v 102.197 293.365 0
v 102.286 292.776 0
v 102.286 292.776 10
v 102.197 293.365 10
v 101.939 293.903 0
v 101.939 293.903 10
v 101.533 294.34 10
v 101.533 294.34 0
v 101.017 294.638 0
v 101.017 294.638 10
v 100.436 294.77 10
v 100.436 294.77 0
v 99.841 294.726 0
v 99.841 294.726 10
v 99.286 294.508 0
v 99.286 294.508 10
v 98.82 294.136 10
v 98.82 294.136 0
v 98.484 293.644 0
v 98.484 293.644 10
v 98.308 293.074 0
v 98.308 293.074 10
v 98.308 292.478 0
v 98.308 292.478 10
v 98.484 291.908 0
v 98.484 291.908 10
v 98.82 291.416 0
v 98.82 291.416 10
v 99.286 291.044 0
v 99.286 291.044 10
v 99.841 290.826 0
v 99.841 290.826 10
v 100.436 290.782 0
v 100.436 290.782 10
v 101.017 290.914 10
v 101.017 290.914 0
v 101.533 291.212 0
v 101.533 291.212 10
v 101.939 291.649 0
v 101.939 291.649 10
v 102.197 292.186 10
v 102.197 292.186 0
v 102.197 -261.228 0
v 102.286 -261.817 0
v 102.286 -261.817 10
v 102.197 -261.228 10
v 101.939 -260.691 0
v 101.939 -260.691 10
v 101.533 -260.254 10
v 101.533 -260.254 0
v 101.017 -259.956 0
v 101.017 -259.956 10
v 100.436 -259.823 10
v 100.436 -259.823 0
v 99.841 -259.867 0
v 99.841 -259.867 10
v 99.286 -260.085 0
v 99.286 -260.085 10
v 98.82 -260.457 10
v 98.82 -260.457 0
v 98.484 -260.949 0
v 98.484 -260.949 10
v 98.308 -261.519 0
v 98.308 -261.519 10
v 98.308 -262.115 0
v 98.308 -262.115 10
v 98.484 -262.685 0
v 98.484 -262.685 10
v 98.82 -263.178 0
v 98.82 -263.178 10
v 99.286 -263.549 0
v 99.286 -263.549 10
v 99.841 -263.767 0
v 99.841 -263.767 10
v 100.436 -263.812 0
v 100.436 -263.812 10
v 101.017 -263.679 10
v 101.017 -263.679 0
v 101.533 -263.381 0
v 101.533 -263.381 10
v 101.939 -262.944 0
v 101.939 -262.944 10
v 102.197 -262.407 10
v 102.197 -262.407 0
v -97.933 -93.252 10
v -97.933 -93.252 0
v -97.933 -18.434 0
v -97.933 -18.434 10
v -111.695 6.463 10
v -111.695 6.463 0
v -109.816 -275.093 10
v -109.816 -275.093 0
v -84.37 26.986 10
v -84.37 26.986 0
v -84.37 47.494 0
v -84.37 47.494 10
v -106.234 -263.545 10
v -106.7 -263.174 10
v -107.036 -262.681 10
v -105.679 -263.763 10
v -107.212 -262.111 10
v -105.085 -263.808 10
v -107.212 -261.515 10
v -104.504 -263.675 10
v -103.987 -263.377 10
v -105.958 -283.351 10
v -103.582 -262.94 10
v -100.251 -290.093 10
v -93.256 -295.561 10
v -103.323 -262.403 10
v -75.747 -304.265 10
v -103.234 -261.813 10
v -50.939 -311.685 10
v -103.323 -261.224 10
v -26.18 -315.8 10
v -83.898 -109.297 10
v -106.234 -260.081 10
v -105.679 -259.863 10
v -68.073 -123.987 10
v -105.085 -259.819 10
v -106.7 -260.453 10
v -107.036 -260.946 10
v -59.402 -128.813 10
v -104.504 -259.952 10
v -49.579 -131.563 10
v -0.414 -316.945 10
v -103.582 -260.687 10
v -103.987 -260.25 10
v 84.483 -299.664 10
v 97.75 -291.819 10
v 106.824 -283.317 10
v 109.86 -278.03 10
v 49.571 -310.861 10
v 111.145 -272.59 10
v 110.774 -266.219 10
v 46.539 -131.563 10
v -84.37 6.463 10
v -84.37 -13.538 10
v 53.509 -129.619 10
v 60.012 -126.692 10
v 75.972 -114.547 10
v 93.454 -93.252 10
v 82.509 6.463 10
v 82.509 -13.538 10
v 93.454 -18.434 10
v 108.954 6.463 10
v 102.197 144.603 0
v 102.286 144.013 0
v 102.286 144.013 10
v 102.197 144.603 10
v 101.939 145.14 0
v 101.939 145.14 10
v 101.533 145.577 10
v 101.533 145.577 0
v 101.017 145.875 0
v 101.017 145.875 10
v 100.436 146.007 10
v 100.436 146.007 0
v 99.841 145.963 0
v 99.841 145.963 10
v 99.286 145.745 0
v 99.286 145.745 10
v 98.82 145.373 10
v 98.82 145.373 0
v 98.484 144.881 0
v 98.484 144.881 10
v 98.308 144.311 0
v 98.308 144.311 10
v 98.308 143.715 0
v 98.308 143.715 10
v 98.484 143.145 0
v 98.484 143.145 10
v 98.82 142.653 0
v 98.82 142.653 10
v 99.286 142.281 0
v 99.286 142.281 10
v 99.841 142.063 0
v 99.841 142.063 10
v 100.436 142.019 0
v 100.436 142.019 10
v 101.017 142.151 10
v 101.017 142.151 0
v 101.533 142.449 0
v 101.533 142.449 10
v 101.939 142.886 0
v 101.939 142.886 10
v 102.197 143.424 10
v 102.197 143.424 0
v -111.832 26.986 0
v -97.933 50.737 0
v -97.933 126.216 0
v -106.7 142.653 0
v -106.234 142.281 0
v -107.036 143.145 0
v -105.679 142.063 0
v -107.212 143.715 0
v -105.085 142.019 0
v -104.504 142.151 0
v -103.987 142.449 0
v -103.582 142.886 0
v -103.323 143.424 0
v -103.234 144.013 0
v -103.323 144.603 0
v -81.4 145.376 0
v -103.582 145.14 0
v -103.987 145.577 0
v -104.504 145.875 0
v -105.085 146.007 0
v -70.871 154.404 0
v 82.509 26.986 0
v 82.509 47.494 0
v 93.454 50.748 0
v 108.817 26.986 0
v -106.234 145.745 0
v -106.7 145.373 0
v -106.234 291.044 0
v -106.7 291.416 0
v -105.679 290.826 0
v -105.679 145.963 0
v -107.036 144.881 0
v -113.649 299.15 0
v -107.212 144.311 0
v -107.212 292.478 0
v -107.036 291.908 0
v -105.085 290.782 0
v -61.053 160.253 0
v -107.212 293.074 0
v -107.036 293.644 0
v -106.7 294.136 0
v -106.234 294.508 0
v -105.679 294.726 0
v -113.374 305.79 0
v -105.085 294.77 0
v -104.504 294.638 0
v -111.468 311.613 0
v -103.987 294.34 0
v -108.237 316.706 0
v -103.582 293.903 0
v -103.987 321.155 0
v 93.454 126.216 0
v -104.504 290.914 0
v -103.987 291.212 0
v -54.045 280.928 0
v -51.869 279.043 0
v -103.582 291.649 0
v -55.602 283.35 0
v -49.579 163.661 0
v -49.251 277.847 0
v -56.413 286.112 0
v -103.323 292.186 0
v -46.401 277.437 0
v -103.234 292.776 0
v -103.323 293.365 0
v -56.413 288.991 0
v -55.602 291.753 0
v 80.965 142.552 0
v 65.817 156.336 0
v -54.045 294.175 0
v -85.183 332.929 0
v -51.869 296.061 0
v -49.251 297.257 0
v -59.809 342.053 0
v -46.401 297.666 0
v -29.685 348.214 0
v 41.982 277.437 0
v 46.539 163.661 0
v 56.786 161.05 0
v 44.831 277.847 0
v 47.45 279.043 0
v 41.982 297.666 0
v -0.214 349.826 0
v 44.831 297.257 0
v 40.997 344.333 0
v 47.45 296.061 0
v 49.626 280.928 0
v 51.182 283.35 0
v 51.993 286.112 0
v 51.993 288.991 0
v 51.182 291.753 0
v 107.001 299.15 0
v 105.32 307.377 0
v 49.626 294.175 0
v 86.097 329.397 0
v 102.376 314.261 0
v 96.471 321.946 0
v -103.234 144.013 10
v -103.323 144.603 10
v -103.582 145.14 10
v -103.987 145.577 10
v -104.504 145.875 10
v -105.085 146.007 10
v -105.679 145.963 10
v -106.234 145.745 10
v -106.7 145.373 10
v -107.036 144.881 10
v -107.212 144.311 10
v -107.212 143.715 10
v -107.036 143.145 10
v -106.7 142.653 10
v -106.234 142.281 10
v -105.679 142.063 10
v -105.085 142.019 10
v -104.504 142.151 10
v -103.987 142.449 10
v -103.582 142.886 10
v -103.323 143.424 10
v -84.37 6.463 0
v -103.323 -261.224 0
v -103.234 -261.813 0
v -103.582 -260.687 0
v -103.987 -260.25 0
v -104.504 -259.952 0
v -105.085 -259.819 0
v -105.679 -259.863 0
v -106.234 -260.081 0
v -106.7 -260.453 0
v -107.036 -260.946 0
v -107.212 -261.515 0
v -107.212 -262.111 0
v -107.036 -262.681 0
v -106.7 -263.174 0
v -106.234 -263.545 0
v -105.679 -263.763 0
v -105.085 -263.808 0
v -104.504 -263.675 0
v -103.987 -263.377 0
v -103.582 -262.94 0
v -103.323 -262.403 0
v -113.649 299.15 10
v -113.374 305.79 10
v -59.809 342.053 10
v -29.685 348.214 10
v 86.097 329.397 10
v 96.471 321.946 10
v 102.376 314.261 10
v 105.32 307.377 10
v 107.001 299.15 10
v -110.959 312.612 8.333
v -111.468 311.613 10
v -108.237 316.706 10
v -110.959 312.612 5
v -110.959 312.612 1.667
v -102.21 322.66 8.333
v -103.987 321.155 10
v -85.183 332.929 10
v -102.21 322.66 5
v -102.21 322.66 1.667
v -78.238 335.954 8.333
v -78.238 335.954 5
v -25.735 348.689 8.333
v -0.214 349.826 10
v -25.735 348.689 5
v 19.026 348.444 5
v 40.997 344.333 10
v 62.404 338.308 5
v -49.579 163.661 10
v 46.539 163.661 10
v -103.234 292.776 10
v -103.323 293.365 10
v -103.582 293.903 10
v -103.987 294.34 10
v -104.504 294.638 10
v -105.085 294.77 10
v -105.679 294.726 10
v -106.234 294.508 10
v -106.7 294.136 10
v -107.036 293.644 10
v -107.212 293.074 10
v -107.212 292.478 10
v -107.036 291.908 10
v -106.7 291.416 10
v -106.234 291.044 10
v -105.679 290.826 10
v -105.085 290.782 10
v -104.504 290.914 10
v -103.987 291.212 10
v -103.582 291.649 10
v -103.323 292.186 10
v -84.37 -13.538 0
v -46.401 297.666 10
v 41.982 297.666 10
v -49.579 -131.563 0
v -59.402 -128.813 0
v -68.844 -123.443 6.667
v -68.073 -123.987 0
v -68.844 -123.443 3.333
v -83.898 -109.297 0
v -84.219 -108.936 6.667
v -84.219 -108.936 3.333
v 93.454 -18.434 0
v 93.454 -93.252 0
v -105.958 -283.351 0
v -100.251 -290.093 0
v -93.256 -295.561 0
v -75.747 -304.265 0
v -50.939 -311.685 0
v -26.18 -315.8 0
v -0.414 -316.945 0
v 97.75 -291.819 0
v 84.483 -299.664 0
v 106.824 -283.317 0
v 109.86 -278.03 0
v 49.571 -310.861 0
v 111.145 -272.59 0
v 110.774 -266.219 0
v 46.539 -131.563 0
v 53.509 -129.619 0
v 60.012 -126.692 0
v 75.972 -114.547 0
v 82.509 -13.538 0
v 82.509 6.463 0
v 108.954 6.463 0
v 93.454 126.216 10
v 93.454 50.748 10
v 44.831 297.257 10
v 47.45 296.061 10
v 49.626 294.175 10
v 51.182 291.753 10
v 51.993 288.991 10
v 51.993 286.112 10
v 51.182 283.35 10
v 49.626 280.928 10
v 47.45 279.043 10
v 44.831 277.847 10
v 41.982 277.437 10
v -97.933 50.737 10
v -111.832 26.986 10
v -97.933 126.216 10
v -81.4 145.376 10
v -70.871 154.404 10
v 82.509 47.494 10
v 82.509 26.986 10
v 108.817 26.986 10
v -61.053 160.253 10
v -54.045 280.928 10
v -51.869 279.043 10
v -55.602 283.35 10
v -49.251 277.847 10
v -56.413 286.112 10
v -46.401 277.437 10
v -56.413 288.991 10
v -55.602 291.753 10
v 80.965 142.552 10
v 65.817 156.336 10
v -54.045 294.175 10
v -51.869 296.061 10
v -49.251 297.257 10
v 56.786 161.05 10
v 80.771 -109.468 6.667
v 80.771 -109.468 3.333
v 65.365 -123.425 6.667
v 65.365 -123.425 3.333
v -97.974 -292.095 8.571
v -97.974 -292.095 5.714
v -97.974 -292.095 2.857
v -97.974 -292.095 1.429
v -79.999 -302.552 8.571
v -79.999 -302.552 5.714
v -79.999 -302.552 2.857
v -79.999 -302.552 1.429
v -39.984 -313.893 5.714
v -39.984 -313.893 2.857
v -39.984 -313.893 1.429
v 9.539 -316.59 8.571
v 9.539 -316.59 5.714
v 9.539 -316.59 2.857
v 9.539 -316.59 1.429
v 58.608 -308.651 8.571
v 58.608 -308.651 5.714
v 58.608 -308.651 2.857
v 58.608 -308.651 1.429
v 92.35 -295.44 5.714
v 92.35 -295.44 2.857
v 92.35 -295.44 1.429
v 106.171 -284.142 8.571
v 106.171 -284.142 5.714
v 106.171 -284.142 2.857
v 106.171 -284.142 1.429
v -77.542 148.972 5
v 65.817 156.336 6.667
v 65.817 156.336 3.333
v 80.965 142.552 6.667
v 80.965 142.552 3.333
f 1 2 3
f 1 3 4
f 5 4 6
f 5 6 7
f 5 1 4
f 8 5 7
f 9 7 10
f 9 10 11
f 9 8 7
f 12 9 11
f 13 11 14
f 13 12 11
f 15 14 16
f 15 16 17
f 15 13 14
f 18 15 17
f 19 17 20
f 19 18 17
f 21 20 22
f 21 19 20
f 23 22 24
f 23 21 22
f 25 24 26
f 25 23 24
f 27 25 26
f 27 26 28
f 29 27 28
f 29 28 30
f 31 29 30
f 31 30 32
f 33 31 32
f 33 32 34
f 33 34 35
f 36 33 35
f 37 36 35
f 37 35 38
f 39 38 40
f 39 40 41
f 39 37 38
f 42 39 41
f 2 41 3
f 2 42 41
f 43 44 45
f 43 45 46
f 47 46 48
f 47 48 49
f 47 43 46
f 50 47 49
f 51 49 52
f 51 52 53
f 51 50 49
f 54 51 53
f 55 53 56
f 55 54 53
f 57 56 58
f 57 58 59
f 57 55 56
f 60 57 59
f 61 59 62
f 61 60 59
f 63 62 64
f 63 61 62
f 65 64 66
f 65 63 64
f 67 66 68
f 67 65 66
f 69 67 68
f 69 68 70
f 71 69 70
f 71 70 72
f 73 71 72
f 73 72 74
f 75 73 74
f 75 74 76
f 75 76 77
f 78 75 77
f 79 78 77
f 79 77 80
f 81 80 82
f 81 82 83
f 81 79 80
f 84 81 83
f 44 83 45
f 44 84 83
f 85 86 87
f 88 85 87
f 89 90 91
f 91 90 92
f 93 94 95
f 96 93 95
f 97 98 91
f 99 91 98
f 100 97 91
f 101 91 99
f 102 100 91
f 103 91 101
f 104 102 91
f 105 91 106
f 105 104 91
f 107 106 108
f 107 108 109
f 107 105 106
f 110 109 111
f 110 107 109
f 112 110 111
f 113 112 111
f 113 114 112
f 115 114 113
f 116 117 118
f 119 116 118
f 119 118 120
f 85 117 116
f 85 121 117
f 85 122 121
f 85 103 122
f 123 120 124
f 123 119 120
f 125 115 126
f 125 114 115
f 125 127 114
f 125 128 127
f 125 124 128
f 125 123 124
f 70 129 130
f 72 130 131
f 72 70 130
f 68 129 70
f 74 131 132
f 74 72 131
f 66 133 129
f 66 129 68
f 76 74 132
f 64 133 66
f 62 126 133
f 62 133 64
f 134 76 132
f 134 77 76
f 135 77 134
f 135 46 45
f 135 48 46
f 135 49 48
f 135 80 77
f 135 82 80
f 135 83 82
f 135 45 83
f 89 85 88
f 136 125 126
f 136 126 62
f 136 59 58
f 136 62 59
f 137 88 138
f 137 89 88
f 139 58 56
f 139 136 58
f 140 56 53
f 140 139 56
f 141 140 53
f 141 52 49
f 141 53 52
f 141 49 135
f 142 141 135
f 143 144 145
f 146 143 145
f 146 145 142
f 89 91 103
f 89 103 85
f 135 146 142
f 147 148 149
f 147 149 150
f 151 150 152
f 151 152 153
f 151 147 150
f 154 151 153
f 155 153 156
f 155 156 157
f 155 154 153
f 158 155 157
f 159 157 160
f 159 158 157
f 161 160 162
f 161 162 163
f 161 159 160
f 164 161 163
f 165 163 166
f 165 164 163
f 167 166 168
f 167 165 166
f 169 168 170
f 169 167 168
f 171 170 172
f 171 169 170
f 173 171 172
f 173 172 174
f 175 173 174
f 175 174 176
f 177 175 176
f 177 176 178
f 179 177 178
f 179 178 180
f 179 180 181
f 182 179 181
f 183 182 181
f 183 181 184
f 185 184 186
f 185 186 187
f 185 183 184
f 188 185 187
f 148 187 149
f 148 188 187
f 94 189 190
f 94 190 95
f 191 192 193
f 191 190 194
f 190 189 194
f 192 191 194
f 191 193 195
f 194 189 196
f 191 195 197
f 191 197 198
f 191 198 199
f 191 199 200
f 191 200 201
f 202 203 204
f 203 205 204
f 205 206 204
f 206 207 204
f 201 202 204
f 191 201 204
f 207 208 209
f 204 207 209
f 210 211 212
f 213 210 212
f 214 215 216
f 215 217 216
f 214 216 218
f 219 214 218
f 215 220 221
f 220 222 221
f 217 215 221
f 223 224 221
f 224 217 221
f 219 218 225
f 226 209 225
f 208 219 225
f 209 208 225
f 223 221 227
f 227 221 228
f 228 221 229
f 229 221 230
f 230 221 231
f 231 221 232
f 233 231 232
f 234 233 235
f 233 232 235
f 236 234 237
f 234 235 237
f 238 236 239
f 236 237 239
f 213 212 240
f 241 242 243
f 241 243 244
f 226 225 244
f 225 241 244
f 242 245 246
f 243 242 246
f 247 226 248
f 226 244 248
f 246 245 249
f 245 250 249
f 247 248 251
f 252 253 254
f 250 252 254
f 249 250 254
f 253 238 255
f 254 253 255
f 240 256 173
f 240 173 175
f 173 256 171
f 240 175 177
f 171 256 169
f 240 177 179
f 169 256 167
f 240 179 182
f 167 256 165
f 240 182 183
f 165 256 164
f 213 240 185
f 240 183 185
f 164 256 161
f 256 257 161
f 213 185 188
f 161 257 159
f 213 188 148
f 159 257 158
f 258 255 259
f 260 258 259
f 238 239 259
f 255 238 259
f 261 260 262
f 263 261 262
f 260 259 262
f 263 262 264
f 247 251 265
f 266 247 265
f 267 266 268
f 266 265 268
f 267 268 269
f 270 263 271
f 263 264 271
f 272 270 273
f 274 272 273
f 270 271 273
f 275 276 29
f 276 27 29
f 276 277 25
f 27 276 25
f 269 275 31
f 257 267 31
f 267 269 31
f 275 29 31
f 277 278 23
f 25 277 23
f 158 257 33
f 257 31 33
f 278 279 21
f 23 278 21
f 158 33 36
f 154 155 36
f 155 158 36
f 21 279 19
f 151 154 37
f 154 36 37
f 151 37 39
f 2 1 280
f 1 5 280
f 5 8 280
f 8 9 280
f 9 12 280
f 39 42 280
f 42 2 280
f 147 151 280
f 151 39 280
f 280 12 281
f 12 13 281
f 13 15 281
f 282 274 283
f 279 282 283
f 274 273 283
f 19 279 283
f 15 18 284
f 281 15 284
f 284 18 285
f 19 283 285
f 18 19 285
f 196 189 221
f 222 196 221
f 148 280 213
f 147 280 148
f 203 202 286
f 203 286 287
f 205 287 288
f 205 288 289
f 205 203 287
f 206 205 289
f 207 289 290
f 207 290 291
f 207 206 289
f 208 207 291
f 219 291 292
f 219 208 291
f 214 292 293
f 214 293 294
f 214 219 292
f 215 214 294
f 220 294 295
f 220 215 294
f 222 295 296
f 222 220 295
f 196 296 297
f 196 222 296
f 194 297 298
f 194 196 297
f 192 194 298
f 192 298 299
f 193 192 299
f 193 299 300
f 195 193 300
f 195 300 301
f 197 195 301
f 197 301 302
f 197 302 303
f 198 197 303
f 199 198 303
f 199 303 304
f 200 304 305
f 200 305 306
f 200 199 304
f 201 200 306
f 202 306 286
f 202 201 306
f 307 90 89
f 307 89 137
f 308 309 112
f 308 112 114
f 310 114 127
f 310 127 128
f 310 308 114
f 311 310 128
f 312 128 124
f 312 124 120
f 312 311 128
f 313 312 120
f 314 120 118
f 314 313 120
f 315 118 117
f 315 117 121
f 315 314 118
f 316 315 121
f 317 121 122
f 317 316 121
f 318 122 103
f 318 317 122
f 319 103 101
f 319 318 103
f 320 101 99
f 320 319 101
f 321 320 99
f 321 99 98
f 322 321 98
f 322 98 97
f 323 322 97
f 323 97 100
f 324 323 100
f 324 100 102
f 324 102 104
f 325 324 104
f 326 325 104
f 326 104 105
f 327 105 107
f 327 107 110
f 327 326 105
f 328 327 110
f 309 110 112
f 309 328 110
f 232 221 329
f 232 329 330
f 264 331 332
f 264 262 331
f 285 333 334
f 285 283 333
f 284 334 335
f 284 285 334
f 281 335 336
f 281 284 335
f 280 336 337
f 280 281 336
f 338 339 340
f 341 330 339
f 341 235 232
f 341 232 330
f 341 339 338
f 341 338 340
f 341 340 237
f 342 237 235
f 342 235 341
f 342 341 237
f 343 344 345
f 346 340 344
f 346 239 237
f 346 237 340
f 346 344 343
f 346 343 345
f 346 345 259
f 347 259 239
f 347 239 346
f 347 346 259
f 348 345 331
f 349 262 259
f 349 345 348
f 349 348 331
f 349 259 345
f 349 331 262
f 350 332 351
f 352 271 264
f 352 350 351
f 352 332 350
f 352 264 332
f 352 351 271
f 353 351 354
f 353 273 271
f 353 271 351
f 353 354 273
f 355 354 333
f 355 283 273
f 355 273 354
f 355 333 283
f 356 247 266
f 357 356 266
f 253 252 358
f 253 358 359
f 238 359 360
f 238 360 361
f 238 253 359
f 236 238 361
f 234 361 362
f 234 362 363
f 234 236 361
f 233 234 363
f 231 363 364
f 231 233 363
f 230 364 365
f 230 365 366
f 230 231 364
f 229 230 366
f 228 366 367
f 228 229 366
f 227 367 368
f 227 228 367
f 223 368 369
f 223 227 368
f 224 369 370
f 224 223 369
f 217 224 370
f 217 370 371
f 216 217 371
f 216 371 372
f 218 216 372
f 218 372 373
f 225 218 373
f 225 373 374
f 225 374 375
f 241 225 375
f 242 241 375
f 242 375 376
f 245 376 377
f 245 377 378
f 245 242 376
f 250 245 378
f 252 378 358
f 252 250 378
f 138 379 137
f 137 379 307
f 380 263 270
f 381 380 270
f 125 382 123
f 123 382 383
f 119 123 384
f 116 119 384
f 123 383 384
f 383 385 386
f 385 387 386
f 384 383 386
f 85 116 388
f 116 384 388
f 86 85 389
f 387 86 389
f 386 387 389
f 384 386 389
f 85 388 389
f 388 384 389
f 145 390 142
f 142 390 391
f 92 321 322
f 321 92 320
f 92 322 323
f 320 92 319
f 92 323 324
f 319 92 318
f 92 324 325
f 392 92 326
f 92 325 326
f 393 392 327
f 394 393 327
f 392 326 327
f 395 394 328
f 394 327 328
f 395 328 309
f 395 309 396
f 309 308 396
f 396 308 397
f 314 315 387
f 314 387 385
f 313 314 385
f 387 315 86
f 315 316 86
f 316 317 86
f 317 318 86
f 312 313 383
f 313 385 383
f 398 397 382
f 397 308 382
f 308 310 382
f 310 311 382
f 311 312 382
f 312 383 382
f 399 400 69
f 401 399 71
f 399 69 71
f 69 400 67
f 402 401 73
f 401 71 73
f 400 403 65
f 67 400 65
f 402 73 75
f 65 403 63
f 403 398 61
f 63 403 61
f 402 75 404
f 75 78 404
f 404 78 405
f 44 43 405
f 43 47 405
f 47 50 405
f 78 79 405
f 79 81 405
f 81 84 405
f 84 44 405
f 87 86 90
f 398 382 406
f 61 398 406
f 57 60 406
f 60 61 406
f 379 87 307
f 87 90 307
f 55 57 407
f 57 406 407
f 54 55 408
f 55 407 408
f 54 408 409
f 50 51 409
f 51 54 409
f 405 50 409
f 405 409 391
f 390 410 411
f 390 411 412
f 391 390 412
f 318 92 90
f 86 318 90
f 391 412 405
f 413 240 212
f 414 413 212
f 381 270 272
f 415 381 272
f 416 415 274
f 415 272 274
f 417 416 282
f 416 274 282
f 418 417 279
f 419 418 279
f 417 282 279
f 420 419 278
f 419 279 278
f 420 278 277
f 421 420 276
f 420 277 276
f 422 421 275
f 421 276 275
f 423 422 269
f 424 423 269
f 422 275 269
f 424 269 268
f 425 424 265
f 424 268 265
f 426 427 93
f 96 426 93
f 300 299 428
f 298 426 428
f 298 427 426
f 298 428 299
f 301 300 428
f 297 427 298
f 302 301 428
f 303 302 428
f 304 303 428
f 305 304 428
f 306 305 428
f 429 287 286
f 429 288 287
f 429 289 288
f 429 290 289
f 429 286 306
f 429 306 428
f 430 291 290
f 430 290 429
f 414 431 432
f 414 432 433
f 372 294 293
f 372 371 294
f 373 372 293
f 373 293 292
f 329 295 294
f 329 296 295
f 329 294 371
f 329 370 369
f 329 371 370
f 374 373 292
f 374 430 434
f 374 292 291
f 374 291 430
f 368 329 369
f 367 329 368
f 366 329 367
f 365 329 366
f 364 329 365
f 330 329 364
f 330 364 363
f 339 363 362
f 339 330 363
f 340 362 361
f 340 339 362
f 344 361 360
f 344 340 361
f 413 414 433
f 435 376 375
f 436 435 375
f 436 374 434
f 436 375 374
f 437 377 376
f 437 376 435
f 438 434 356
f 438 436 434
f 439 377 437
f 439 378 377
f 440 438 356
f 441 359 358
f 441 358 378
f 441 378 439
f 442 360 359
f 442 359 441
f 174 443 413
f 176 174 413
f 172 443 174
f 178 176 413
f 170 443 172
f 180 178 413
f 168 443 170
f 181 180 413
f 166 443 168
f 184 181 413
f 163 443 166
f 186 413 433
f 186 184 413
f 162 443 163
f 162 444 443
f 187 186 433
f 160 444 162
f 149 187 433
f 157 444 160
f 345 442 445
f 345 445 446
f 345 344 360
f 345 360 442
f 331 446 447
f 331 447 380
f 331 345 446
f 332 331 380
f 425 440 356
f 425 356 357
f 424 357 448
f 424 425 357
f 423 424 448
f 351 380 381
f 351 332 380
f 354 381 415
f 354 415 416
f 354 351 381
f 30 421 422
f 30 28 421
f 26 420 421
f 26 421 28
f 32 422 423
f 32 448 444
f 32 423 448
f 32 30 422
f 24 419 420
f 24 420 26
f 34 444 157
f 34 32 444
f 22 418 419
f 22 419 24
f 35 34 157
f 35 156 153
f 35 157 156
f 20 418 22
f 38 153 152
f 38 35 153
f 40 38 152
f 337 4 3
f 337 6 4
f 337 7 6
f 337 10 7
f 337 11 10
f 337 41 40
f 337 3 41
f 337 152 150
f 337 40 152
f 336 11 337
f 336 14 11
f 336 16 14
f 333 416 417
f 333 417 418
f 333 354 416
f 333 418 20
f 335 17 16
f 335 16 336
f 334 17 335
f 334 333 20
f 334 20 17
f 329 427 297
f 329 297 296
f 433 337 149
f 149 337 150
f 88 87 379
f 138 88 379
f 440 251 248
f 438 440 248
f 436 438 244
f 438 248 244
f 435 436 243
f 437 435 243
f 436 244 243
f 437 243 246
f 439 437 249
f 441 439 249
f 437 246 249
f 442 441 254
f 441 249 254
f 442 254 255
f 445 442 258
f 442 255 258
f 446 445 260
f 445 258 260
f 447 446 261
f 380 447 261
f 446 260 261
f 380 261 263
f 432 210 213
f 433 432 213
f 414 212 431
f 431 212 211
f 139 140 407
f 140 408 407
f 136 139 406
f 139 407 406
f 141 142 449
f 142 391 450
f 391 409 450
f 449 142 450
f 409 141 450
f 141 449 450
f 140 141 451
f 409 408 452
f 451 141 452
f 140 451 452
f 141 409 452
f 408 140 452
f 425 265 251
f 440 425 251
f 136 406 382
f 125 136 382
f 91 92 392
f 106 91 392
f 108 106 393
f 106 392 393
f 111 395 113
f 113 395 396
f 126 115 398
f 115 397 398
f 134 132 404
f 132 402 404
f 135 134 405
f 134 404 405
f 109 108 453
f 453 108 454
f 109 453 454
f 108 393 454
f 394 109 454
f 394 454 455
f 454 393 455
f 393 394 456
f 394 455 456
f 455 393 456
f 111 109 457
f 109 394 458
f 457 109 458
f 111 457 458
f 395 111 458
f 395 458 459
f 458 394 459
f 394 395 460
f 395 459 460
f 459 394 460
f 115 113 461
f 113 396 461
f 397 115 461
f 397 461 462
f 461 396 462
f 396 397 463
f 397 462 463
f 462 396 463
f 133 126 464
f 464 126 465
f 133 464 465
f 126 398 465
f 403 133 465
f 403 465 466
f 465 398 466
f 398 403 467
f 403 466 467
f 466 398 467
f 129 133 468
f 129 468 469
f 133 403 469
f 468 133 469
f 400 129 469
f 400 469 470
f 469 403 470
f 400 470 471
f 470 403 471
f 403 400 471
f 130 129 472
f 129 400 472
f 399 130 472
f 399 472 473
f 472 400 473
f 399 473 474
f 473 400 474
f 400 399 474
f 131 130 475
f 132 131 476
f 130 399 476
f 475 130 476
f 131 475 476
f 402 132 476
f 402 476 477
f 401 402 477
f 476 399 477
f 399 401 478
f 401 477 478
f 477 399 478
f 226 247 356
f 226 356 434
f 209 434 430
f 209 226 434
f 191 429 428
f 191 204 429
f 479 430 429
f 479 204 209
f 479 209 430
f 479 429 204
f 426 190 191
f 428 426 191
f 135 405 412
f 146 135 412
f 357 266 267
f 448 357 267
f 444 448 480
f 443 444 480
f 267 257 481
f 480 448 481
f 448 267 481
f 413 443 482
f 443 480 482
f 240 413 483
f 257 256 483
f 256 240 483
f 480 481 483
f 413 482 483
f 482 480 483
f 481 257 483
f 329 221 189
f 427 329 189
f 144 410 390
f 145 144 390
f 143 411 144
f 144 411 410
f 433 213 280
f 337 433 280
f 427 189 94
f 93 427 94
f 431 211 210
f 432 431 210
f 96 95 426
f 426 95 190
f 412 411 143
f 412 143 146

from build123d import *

# Parameters (mm, degrees)
OUTER_CUT_EXTRUDE_DEPTH   = 10
HANDLE_CUT_DEPTH          = 10
HOLES_R                   = 2
HOLES_CUT_DEPTH           = 10
WHEEL_HOLE_CUT_DEPTH      = 10
SKETCH7_W                 = 220.786532647
SKETCH7_H                 = 20.523195184
SEPERATE_FOR_CUTTER_DEPTH = 10


with BuildPart() as part:
    # Outer Cut → Outer Cut Extrude (new body)
    with BuildSketch(Plane.XY):
        with BuildLine():
            Line((-113.64875635, 299.149763984), (-109.816211971, -275.093135424))
            add(Edge.make_bspline(
                [(-109.816211971, -275.093135424), (-106.607178942, -285.722495836), (-92.230200108, -298.128562103), (-66.171478097, -308.125545605), (-35.490240898, -315.680442969), (7.349343337, -318.529337487), (55.259367963, -311.199249304), (97.276130628, -296.385821585), (112.870760282, -277.133248797), (110.774119471, -266.218850205)],
                knots=[0, 0, 0, 0, 0.122425719, 0.216064372, 0.327166115, 0.494333937, 0.717397449, 0.89956502, 1, 1, 1, 1], degree=3))
            Line((110.774119471, -266.218850205), (107.000802803, 299.149763984))
            add(Edge.make_bspline(
                [(-113.64875635, 299.149763984), (-114.92443064, 313.197885337), (-94.849800602, 330.39336024), (-61.010041387, 342.622533437), (-18.918767828, 351.176947948), (23.609481642, 349.753915079), (71.687448298, 335.692246865), (104.096362102, 325.361995633), (107.000802803, 299.149763984)],
                knots=[0, 0, 0, 0, 0.141861647, 0.27997283, 0.41653257, 0.634994384, 0.759518976, 1, 1, 1, 1], degree=3))
        make_face()
    extrude(amount=OUTER_CUT_EXTRUDE_DEPTH)

    # Handle → Handle Cut (cut)
    with BuildSketch(Plane.XY):
        with BuildLine():
            Line((-46.400999152, 297.666324186), (41.981712091, 297.666324186))
            ThreePointArc((41.981712091, 297.666324186), (52.096354794, 287.551681482), (41.981712091, 277.437038779))
            Line((41.981712091, 277.437038779), (-46.400999152, 277.437038779))
            ThreePointArc((-46.400999152, 277.437038779), (-56.515641856, 287.551681482), (-46.400999152, 297.666324186))
        make_face()
    extrude(amount=HANDLE_CUT_DEPTH, mode=Mode.SUBTRACT)

    # Holes → Holes Cut (cut)
    with BuildSketch(Plane.XY):
        with Locations((100.286043104, 292.77598768)):
            Circle(HOLES_R)
        with Locations((-105.2341902, 292.77598768)):
            Circle(HOLES_R)
        with Locations((-105.2341902, 144.013070247)):
            Circle(HOLES_R)
        with Locations((100.286043104, 144.013070247)):
            Circle(HOLES_R)
        with Locations((-105.2341902, -261.81330375)):
            Circle(HOLES_R)
        with Locations((100.2860431, -261.817262146)):
            Circle(HOLES_R)
    extrude(amount=HOLES_CUT_DEPTH, mode=Mode.SUBTRACT)

    # Wheel Hole → Wheel Hole Cut (cut)
    with BuildSketch(Plane.XY):
        with BuildLine():
            Line((-49.578885474, 163.660859039), (46.538823299, 163.660859039))
            add(Edge.make_bspline(
                [(46.538823299, 163.660859039), (68.37258014, 160.868866886), (81.804733275, 142.525461888), (93.454040823, 126.216230162)],
                knots=[0, 0, 0, 0, 1, 1, 1, 1], degree=3))
            Line((93.454040823, 126.216230162), (93.454040823, 50.747913124))
            Line((93.454040823, 50.747913124), (82.509254189, 47.494057639))
            Line((82.509254189, 47.494057639), (82.509254189, -13.537739036))
            Line((82.509254189, -13.537739036), (93.454040823, -18.433975269))
            Line((93.454040823, -18.433975269), (93.454040823, -93.251893693))
            add(Edge.make_bspline(
                [(93.454040823, -93.251893693), (81.898905096, -109.410102116), (67.308000888, -127.522433958), (46.538823299, -131.563109806)],
                knots=[0, 0, 0, 0, 1, 1, 1, 1], degree=3))
            Line((46.538823299, -131.563109806), (-49.578885474, -131.563109806))
            add(Edge.make_bspline(
                [(-49.578885474, -131.563109806), (-71.532579158, -128.371697231), (-84.306155821, -107.78849923), (-97.932579458, -93.251893693)],
                knots=[0, 0, 0, 0, 1, 1, 1, 1], degree=3))
            Line((-97.932579458, -93.251893693), (-97.932579458, -18.433975269))
            Line((-97.932579458, -18.433975269), (-84.369957975, -13.537739036))
            Line((-84.369957975, -13.537739036), (-84.369957975, 47.494057639))
            Line((-84.369957975, 47.494057639), (-97.932579458, 50.737293211))
            Line((-97.932579458, 50.737293211), (-97.932579458, 126.216230162))
            add(Edge.make_bspline(
                [(-49.578885474, 163.660859039), (-60.56164238, 162.119859802), (-78.227406764, 150.263949312), (-91.83300307, 134.413103774), (-97.932579458, 126.216230162)],
                knots=[0, 0, 0, 0, 0.510558335, 1, 1, 1, 1], degree=3))
        make_face()
    extrude(amount=WHEEL_HOLE_CUT_DEPTH, mode=Mode.SUBTRACT)

    # Sketch7 → Seperate For Cutter (cut)
    with BuildSketch(Plane.XY):
        with Locations((-1.439044765, 16.72411794)):
            Rectangle(SKETCH7_W, SKETCH7_H)
    extrude(amount=SEPERATE_FOR_CUTTER_DEPTH, mode=Mode.SUBTRACT)


solid = part.part
